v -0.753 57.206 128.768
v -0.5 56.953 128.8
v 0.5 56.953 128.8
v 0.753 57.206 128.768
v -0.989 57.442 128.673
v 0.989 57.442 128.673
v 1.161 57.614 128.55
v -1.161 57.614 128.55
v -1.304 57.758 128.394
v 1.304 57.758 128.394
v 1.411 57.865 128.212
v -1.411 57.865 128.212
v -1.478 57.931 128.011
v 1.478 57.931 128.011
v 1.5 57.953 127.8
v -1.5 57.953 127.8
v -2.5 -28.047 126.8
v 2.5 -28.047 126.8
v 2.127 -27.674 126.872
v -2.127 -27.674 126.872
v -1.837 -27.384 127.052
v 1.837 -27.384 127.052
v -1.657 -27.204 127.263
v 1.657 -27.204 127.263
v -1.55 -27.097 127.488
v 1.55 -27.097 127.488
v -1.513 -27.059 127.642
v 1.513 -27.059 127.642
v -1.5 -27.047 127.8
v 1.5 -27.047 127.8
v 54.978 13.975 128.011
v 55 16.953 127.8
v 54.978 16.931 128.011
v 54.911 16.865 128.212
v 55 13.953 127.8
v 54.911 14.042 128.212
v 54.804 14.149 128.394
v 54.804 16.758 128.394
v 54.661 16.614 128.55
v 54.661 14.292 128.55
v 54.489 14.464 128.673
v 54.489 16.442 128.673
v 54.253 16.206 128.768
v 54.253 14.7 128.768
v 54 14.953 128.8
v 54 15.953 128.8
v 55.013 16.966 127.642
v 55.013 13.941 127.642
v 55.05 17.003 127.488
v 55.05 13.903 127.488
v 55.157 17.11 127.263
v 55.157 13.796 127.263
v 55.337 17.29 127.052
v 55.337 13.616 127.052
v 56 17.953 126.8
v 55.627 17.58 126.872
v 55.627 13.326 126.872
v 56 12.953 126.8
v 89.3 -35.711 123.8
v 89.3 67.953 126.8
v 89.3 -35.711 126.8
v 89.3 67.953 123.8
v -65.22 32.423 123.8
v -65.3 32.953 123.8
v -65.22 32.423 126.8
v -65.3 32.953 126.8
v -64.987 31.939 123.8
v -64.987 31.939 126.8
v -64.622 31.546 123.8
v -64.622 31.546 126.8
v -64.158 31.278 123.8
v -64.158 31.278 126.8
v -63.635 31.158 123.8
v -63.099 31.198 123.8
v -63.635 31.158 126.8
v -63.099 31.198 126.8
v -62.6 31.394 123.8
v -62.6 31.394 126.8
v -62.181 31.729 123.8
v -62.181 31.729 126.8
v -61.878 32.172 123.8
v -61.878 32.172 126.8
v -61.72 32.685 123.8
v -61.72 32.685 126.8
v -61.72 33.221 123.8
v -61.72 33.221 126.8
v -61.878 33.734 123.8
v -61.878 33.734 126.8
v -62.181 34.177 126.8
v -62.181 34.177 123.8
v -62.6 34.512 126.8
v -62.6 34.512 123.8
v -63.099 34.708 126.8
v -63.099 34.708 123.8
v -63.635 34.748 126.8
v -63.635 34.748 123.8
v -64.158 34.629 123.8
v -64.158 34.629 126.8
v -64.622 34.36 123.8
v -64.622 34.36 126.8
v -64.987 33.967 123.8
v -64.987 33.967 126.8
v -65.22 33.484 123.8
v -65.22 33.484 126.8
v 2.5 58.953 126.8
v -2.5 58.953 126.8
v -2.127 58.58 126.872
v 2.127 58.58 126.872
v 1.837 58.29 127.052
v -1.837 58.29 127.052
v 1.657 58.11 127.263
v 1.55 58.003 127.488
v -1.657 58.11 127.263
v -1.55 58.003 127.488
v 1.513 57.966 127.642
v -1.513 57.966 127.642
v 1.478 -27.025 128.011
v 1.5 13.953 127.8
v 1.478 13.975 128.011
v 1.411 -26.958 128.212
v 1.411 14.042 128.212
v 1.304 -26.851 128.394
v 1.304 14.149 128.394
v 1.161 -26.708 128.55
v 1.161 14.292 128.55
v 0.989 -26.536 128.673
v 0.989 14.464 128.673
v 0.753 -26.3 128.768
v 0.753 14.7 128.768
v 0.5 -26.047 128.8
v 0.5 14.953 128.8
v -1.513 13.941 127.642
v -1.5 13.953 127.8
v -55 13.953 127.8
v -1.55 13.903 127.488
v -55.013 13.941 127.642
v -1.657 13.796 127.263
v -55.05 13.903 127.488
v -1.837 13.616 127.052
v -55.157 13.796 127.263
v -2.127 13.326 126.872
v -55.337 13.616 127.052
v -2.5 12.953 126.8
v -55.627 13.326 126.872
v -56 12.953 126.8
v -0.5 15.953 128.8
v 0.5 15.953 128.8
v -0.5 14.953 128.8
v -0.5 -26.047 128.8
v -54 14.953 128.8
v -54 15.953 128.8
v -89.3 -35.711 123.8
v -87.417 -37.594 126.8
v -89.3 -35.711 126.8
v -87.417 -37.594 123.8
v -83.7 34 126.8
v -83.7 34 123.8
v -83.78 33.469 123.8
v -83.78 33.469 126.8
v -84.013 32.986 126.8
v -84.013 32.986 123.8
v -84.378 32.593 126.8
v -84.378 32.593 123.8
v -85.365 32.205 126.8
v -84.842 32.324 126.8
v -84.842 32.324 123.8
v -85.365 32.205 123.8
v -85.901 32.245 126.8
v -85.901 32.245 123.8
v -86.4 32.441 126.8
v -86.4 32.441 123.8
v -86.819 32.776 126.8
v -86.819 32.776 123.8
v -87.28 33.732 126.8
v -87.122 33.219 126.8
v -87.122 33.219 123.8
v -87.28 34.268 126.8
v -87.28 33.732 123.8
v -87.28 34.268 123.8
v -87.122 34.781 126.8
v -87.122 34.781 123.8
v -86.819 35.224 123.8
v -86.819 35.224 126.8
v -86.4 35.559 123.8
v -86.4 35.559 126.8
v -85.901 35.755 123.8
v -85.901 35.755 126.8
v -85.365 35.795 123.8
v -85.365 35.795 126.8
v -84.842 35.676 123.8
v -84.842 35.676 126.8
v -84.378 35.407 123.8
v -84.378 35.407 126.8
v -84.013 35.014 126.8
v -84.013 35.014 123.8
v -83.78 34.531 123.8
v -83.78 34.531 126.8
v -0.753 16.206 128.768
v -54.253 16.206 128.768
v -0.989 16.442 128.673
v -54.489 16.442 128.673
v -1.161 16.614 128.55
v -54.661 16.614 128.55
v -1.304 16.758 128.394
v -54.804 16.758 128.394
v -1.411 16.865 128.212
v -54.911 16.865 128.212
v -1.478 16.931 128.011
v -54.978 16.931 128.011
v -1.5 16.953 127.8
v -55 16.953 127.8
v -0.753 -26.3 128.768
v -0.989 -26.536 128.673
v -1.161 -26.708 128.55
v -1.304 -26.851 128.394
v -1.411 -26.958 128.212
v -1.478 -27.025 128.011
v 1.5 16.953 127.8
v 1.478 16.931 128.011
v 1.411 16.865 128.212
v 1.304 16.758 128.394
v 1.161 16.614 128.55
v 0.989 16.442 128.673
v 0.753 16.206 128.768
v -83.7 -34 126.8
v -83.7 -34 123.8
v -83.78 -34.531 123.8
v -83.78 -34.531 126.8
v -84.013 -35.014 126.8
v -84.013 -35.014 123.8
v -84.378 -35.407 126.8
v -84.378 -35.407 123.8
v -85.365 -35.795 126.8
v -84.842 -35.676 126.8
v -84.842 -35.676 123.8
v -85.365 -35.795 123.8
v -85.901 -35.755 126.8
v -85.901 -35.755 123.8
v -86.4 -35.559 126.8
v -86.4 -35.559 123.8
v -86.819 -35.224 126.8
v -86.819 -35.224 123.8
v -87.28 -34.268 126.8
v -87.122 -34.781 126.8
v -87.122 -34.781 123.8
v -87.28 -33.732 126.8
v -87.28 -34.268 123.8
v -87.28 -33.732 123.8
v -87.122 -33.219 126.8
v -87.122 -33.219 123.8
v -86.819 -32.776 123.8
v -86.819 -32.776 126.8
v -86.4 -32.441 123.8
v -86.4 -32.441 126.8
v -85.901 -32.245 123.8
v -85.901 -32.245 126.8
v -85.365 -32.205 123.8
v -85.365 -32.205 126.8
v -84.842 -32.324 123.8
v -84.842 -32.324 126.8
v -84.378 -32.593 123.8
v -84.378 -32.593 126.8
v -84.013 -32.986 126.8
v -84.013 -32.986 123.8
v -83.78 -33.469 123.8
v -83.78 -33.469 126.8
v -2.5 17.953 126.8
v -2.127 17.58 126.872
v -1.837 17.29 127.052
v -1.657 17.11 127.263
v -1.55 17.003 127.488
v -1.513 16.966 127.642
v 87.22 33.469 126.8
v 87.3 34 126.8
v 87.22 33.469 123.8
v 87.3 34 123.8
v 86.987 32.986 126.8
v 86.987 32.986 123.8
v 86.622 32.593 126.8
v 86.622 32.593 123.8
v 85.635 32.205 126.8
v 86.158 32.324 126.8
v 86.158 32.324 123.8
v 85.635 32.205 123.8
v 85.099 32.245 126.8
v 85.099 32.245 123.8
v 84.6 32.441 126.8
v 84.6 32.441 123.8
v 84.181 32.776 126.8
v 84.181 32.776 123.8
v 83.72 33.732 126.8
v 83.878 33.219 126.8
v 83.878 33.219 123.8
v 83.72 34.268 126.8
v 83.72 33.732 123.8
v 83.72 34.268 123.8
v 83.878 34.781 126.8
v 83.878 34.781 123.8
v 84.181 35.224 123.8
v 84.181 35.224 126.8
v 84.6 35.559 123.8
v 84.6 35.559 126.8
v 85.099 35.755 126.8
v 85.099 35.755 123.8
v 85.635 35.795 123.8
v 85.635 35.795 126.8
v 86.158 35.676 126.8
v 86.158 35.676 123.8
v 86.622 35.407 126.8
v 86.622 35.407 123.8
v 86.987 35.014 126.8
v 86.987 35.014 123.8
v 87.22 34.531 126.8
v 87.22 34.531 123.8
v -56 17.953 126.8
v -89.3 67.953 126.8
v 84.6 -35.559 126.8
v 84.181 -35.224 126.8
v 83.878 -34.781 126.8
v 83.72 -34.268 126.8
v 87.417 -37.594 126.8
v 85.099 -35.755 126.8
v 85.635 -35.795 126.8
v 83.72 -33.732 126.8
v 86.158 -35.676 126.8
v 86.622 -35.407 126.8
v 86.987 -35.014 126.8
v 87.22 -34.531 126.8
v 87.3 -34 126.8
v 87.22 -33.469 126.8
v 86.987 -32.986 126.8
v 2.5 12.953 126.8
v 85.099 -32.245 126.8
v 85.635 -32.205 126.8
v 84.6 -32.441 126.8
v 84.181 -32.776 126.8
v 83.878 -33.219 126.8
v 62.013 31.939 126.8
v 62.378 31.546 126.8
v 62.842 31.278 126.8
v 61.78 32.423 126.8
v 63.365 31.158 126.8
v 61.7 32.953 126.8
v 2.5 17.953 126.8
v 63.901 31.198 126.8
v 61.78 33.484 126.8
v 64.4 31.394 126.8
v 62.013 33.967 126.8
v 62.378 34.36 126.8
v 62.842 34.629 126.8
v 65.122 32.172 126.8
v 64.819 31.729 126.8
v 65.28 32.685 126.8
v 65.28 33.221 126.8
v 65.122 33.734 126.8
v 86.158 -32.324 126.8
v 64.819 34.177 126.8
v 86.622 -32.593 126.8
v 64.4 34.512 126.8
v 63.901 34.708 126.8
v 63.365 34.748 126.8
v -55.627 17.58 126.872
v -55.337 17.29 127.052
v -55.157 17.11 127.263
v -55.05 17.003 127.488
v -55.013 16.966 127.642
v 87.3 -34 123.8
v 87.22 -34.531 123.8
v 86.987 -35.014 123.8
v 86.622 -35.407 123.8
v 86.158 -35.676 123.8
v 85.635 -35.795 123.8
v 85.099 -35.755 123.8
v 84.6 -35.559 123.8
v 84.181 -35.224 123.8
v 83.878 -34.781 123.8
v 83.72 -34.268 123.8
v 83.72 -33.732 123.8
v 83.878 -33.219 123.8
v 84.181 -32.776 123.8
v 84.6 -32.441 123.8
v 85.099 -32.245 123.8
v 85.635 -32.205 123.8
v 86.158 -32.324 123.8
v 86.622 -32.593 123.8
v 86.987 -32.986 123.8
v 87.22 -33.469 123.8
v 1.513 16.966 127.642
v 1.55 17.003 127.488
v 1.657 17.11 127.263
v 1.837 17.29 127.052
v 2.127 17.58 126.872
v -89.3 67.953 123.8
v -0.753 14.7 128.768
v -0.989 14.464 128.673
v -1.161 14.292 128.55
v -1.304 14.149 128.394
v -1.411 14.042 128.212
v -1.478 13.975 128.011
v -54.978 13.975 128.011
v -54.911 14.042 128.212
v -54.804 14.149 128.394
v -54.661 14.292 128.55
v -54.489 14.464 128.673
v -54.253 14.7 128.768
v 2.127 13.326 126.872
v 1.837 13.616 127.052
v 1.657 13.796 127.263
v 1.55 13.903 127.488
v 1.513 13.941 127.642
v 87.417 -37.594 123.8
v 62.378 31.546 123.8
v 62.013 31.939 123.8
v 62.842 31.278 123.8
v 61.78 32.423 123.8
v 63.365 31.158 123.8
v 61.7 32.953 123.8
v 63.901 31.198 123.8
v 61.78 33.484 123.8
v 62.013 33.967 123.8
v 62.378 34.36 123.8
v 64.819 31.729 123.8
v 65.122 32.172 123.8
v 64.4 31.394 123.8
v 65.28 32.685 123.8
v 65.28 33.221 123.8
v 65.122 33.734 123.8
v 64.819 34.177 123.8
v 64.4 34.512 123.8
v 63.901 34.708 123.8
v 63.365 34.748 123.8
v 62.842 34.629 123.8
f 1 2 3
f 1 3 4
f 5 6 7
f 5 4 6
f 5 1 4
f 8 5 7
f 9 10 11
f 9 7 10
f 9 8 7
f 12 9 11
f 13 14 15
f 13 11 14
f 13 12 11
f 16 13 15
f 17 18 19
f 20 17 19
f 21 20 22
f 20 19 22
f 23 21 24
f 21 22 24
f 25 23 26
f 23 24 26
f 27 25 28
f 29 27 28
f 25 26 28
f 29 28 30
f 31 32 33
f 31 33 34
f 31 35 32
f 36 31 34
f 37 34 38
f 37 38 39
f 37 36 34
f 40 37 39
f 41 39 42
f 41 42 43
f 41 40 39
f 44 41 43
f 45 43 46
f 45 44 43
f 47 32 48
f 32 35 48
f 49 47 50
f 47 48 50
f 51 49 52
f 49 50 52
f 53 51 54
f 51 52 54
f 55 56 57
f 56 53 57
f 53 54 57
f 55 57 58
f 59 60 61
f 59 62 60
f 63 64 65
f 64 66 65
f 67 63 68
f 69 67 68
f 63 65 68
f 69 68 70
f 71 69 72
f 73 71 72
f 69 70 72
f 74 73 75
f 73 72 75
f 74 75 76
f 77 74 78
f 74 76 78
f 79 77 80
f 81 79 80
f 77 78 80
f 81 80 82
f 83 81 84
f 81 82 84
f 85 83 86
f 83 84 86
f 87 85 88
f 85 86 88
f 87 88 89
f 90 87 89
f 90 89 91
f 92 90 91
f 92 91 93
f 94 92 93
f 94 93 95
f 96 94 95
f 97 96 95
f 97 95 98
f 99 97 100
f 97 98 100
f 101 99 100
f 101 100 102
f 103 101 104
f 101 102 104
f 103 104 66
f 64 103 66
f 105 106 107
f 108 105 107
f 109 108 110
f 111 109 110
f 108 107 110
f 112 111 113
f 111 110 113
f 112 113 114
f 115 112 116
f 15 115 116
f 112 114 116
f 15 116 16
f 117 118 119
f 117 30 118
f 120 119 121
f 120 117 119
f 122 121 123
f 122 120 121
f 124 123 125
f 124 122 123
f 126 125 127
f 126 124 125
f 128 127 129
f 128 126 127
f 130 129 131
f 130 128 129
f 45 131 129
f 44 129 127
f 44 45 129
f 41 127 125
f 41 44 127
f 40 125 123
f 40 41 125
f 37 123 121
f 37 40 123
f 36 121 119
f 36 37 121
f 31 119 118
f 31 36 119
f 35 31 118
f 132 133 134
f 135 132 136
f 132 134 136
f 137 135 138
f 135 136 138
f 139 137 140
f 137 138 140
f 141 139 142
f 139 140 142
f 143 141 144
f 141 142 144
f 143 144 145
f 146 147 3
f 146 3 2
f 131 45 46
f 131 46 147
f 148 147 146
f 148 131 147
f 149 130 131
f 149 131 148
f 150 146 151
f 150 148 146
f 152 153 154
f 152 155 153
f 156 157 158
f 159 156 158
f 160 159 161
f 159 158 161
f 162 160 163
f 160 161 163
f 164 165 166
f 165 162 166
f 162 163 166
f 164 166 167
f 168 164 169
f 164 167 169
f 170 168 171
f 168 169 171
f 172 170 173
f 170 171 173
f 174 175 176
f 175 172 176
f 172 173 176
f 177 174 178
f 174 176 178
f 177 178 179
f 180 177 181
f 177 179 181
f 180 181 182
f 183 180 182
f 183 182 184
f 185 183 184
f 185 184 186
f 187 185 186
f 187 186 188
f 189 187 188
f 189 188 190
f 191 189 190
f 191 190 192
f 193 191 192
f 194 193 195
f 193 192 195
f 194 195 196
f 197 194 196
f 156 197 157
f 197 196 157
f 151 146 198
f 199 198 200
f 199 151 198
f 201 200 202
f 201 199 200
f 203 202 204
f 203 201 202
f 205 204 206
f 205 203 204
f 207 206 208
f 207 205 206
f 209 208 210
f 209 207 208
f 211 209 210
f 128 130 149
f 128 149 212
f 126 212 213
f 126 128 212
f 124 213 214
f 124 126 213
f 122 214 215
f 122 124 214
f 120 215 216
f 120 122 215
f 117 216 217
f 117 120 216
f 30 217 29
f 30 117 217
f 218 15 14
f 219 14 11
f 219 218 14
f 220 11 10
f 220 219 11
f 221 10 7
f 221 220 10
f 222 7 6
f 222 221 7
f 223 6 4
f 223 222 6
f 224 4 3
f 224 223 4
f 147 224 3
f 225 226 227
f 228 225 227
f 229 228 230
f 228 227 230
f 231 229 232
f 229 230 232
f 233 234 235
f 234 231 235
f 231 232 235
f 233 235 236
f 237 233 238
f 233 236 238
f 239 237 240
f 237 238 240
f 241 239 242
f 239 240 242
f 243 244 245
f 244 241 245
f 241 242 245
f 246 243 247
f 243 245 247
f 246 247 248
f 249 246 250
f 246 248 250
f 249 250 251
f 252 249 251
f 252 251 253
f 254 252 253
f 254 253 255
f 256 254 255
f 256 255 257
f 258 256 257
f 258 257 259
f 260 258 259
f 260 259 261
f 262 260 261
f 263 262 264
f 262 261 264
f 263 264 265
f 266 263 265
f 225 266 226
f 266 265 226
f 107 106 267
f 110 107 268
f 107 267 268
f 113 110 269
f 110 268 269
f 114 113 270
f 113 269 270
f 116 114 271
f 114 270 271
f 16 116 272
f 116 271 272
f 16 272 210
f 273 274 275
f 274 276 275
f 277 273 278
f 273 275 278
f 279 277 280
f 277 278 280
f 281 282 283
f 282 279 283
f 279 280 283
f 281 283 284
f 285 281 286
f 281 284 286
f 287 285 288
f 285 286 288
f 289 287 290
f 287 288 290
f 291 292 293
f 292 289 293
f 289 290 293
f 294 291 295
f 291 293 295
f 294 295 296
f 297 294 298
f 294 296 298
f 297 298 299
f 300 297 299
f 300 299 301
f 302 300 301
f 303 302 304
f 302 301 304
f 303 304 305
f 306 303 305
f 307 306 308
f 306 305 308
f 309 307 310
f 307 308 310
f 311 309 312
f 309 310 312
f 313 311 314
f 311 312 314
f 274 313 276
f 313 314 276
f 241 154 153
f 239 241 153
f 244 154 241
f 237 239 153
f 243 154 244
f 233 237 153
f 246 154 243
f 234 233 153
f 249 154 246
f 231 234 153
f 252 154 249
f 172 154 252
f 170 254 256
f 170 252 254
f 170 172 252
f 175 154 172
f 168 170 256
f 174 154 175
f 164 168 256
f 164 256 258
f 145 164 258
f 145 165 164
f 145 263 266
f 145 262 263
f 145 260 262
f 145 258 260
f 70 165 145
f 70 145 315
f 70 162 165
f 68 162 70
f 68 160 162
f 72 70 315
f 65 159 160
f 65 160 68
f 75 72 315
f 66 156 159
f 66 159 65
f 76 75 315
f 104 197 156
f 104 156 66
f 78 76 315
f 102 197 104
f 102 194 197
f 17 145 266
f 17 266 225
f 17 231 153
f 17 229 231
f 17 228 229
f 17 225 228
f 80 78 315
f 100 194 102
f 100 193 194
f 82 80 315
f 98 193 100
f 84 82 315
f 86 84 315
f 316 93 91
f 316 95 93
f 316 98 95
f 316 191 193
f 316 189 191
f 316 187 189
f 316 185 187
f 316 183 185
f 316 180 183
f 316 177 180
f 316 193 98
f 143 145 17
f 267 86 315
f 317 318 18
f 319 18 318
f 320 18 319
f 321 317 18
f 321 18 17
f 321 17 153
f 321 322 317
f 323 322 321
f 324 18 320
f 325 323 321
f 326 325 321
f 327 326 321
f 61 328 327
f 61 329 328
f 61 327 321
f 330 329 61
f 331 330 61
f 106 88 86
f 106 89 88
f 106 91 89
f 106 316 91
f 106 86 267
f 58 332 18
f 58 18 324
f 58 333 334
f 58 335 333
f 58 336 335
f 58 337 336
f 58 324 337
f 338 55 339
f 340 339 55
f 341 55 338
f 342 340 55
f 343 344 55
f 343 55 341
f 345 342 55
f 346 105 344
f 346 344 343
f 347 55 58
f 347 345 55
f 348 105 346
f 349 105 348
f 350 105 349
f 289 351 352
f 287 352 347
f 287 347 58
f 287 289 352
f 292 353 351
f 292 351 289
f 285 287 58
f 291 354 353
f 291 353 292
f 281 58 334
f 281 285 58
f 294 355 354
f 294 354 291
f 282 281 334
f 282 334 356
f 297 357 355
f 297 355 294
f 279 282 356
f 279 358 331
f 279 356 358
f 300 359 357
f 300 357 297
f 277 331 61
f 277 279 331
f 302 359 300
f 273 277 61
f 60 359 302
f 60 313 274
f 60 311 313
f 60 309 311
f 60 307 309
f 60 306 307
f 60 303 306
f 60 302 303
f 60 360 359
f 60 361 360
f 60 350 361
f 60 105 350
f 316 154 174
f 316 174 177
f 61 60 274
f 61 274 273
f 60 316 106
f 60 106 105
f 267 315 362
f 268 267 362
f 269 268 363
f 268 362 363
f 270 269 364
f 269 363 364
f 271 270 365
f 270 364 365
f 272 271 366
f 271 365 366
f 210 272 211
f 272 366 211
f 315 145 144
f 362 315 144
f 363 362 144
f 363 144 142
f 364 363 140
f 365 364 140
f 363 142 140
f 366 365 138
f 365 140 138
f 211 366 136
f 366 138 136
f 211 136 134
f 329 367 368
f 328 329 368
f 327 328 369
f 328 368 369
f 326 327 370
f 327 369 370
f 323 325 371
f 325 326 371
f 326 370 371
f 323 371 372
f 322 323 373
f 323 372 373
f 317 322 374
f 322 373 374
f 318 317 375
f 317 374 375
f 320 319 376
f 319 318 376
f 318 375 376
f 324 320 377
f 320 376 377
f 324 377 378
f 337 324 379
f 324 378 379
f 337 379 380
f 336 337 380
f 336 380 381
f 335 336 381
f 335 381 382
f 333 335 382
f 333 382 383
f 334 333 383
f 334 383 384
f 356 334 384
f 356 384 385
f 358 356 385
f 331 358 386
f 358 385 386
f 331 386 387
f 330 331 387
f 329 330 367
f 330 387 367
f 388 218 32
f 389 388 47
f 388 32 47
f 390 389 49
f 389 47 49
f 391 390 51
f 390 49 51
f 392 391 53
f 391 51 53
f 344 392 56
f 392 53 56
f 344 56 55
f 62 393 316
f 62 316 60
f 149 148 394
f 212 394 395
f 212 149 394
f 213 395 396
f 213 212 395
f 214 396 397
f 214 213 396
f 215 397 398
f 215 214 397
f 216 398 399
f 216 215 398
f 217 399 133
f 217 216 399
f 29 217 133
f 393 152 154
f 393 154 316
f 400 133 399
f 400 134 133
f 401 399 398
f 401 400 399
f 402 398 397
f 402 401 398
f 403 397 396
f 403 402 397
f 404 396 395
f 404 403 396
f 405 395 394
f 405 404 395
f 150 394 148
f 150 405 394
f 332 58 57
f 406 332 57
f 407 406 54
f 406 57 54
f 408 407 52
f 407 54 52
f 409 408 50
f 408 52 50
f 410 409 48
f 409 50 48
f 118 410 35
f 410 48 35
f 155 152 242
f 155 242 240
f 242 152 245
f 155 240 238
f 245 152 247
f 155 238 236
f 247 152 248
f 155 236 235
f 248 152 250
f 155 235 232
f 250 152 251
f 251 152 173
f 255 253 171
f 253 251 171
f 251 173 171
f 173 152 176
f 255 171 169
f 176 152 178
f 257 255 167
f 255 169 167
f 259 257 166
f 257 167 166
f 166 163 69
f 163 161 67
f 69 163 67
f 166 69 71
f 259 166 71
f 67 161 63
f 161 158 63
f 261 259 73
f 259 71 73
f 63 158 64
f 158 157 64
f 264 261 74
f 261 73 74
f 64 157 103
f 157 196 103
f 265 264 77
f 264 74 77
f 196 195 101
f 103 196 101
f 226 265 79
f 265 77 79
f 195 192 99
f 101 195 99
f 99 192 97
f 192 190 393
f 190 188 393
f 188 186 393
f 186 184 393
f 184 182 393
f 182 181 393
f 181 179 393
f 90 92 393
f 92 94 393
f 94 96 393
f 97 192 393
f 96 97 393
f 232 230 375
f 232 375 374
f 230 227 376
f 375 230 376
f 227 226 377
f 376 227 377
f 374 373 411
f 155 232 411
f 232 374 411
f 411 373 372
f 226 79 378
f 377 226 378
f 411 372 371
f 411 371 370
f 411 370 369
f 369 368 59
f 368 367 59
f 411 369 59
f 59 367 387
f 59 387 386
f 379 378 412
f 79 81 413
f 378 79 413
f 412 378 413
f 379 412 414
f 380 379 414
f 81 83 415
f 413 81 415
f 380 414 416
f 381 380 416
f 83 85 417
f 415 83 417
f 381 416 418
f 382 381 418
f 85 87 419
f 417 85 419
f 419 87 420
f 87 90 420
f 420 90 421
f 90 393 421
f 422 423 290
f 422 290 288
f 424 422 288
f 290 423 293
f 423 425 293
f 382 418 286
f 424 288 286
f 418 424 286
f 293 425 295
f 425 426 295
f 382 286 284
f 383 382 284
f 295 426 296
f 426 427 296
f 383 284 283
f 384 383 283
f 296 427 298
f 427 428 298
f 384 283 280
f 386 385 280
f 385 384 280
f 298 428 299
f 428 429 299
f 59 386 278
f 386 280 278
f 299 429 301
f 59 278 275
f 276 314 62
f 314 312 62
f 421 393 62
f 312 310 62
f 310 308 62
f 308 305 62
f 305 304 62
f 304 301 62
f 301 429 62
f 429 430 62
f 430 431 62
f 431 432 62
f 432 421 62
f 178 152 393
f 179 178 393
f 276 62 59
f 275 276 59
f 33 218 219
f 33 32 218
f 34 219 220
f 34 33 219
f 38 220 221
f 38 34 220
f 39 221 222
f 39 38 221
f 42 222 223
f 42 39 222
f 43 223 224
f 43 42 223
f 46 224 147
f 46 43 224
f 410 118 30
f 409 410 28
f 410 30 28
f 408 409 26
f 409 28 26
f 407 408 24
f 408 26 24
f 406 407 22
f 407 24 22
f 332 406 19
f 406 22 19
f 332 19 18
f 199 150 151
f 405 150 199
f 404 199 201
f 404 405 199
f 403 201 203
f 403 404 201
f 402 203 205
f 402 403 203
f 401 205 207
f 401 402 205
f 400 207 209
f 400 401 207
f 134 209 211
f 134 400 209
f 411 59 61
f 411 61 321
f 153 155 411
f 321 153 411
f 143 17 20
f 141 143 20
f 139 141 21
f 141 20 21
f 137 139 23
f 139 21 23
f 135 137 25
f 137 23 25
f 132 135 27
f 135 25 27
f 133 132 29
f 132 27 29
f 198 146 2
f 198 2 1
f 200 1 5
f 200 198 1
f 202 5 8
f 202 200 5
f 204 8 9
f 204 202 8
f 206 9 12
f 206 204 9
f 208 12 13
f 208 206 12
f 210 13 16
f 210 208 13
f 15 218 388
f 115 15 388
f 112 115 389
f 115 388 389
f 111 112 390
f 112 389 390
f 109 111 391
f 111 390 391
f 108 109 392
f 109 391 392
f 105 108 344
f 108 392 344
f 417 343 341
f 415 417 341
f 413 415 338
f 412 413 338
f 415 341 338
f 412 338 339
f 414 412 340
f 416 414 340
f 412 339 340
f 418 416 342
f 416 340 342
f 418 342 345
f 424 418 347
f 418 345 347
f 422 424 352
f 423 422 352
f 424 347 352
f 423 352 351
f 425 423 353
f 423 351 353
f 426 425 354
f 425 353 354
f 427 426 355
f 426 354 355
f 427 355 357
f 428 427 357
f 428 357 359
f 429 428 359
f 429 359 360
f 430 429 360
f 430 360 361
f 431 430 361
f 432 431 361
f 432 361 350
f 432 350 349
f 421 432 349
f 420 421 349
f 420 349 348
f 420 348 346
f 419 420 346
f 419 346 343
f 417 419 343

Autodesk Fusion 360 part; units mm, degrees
ref_plane "WorkPlane1" through (0, 0, 123.8) normal (0, 0, 1) x (1, 0, 0)
sketch "Sketch1" plane through (0, 0, 123.8) normal (0, 0, 1) x (1, 0, 0)
  circle A0 centre (-85.5, 170) radius 1.4 construction
  line L0 (-81.5, 4) -> (-81.5, 166) construction
  line L1 (-81.5, 166) -> (-81.5, 167) construction
  line L2 (-81.5, 167) -> (-77.5, 167) construction
  line L3 (-77.5, 167) -> (-77.5, 174) construction
  line L4 (-77.5, 174) -> (-81.5, 174) construction
  line L5 (-81.5, 174) -> (-86.5, 174) construction
  line L6 (-87.2574, 174) -> (-87.5, 174) construction
  line L7 (-87.5, 174) -> (-89.5, 172) construction
  line L8 (-89.5, 172) -> (-89.5, 0) construction
  line L9 (-89.5, 0) -> (-81.5, 0) construction
  line L10 (-81.5, 0) -> (-81.5, 4) construction
  circle A1 centre (85.5, 170) radius 1.4 construction
  line L11 (89.5, 0) -> (89.5, 172) construction
  line L12 (89.5, 172) -> (87.5, 174) construction
  line L13 (87.5, 174) -> (86.5, 174) construction
  line L14 (86.5, 174) -> (86.5, 177) construction
  line L15 (86.5, 177) -> (86.45, 177) construction
  line L16 (86.45, 177) -> (86.45, 174) construction
  line L17 (86.45, 174) -> (81.5, 174) construction
  line L18 (81.5, 174) -> (77.5, 174) construction
  line L19 (77.5, 174) -> (77.5, 167) construction
  line L20 (77.5, 167) -> (81.5, 167) construction
  line L21 (81.5, 167) -> (81.5, 0) construction
  line L22 (81.5, 0) -> (89.5, 0) construction
  line L23 (81.5, 0) -> (81.5, -37.7937) construction
  line L24 (81.5, -37.7937) -> (87.5, -37.7937) construction
  line L25 (87.5, -37.7937) -> (89.5, -35.7937) construction
  line L26 (89.5, -35.7937) -> (89.5, -5) construction
  line L27 (89.5, -5) -> (89.5, 0) construction
  line L28 (89.5, 0) -> (81.5, 0) construction
  line L29 (-89.5, 0) -> (-89.5, -35.7937) construction
  line L30 (-89.5, -35.7937) -> (-87.5, -37.7937) construction
  line L31 (-87.5, -37.7937) -> (-81.5, -37.7937) construction
  line L32 (-81.5, -37.7937) -> (-81.5, -5) construction
  line L33 (-81.5, -5) -> (-81.5, 0) construction
  line L34 (-81.5, 0) -> (-89.5, 0) construction
  line L35 (87.5, -37.7937) -> (-87.5, -37.7937) construction
  line L36 (-77.3, 174) -> (77.3, 174) construction
  line L37 (-77.5, 174) -> (77.5, 174)
  line L38 (77.5, 174) -> (87.5, 174)
  line L39 (87.5, 174) -> (89.5, 172)
  line L40 (89.5, 172) -> (89.5, -35.7937)
  line L41 (89.5, -35.7937) -> (87.5, -37.7937)
  line L42 (-87.5, -37.7937) -> (87.5, -37.7937)
  line L43 (-87.5, -37.7937) -> (-89.5, -35.7937)
  line L44 (-89.5, -35.7937) -> (-89.5, 172)
  line L45 (-89.5, 172) -> (-87.5, 174)
  line L46 (-87.5, 174) -> (-77.3, 174)
  circle A2 centre (-85.5, 170) radius 1.8
  circle A3 centre (-85.5, 102) radius 1.8
  circle A4 centre (-85.5, 34) radius 1.8
  circle A5 centre (-85.5, -34) radius 1.8
  circle A6 centre (85.5, -34) radius 1.8
  circle A7 centre (85.5, 34) radius 1.8
  circle A8 centre (85.5, 102) radius 1.8
  circle A9 centre (85.5, 170) radius 1.8
  line L47 (-86.5, 174) -> (-87.2574, 174)
  circle A10 centre (85.5, -34) radius 1.4 construction
  circle A11 centre (-85.5, -34) radius 1.4 construction
  circle A12 centre (-85.5, 34) radius 1.4 construction
  circle A13 centre (-85.5, 102) radius 1.4 construction
  circle A14 centre (85.5, 102) radius 1.4 construction
  circle A15 centre (85.5, 34) radius 1.4 construction
  line L48 (-89.5, 68.1031) -> (89.5, 68.1031) construction
  line L49 (-89.5, 67.9531) -> (89.5, 67.9531)
  line L50 (-77.5, 173.8) -> (-77.3, 173.8)
  line L51 (-77.3, 173.8) -> (77.5, 173.8)
  line L52 (77.5, 173.8) -> (87.4172, 173.8)
  line L53 (87.4172, 173.8) -> (89.3, 171.9172)
  line L54 (89.3, 171.9172) -> (89.3, -35.7109)
  line L55 (89.3, -35.7109) -> (87.4172, -37.5937)
  line L56 (-87.4172, -37.5937) -> (87.4172, -37.5937)
  line L57 (-87.4172, -37.5937) -> (-89.3, -35.7109)
  line L58 (-89.3, -35.7109) -> (-89.3, 171.9172)
  line L59 (-89.3, 171.9172) -> (-87.4172, 173.8)
  line L60 (-87.4172, 173.8) -> (-77.3, 173.8)
  dimension "d2" = 0.2
  dimension "d4" = 3.6
  dimension "d5" = 3.6
  dimension "d6" = 3.6
  dimension "d7" = 3.6
  dimension "d8" = 3.6
  dimension "d9" = 3.6
  dimension "d10" = 3.6
  dimension "d11" = 3.6
  dimension "d14" = 0.15
extrude "Extrude1" add sketch "Sketch1" along normal blind 3 contours L49 L54 L55 L56 L57 L58
sketch "Sketch2" plane through (0, 0, 126.8) normal (0, 0, 1) x (-1, 0, 0)
  circle A0 centre (85.5, 34) radius 1.8
  circle A1 centre (-85.5, 34) radius 1.8
  circle A2 centre (-85.5, -34) radius 1.8
  circle A3 centre (85.5, -34) radius 1.8
  line L0 (87.4172, 37.5937) -> (-87.4172, 37.5937)
  line L1 (-87.4172, 37.5937) -> (-89.3, 35.7109)
  line L2 (-89.3, 35.7109) -> (-89.3, -67.9531)
  line L3 (-89.3, -67.9531) -> (89.3, -67.9531)
  line L4 (89.3, -67.9531) -> (89.3, 35.7109)
  line L5 (89.3, 35.7109) -> (87.4172, 37.5937)
  line L6 (0, -67.9531) -> (0, 37.5937) construction
  line L7 (0, -67.9531) -> (0, -32.9531) construction
  line L8 (0, -32.9531) -> (-63.5, -32.9531) construction
  circle A4 centre (-63.5, -32.9531) radius 1.8
  circle A5 centre (63.5, -32.9531) radius 1.8
  dimension "d15" = 35
  dimension "d16" = 63.5
  dimension "d17" = 3.6
extrude "Extrude2" cut sketch "Sketch2" against normal blind 3 contours A4 | A5
sketch "Sketch3" plane through (0, 0, 126.8) normal (0, 0, 1) x (-1, 0, 0)
  circle A0 centre (-63.5, -32.9531) radius 1.8
  circle A1 centre (63.5, -32.9531) radius 1.8
  circle A2 centre (85.5, 34) radius 1.8
  circle A3 centre (-85.5, 34) radius 1.8
  circle A4 centre (-85.5, -34) radius 1.8
  circle A5 centre (85.5, -34) radius 1.8
  line L0 (87.4172, 37.5937) -> (-87.4172, 37.5937)
  line L1 (-87.4172, 37.5937) -> (-89.3, 35.7109)
  line L2 (-89.3, 35.7109) -> (-89.3, -67.9531)
  line L3 (-89.3, -67.9531) -> (89.3, -67.9531)
  line L4 (89.3, -67.9531) -> (89.3, 35.7109)
  line L5 (89.3, 35.7109) -> (87.4172, 37.5937)
  line L6 (0, -67.9531) -> (0, -57.9531) construction
  line L7 (0, -57.9531) -> (0, 27.0469) construction
  line L8 (0, -15.4531) -> (-55, -15.4531) construction
  line L9 (0, -15.4531) -> (55, -15.4531) construction
  line L10 (1.5, -13.9531) -> (55, -13.9531)
  line L11 (-1.5, -13.9531) -> (-55, -13.9531)
  line L12 (1.5, -16.9531) -> (55, -16.9531)
  line L13 (-1.5, -16.9531) -> (-55, -16.9531)
  line L14 (-55, -16.9531) -> (-55, -13.9531)
  line L15 (55, -16.9531) -> (55, -13.9531)
  line L16 (-1.5, -57.9531) -> (1.5, -57.9531)
  line L17 (1.5, 27.0469) -> (-1.5, 27.0469)
  line L18 (1.5, -57.9531) -> (1.5, -16.9531)
  line L19 (1.5, -13.9531) -> (1.5, 27.0469)
  line L20 (-1.5, -57.9531) -> (-1.5, -16.9531)
  line L21 (-1.5, -13.9531) -> (-1.5, 27.0469)
  dimension "d20" = 10
  dimension "d21" = 85
  dimension "d22" = 55
  dimension "d23" = 55
extrude "Extrude3" add sketch "Sketch3" along normal blind 2 contours L10 L11 L12 L13 L14 L15 L16 L17 L18 L19 L20 L21
fillet "Fillet1" radius 1 12 edges at (-28.25, 13.9531, 126.8) (-1.5, -6.5469, 126.8) (-55, 15.4531, 126.8) (0, -27.0469, 126.8) (1.5, -6.5469, 126.8) (28.25, 13.9531, 126.8) (1.5, 37.4531, 126.8) (55, 15.4531, 126.8) (28.25, 16.9531, 126.8) (0, 57.9531, 126.8) (-28.25, 16.9531, 126.8) (-1.5, 37.4531, 126.8) 1 faces at (19.3333, 15.9531, 128.8)
equation "large_m3 = 3.6 mm"
equation "d4 = large_m3"
equation "d5 = d4"
equation "d6 = d4"
equation "d7 = d4"
equation "d8 = d4"
equation "d9 = d4"
equation "d10 = d4"
equation "d11 = d4"
equation "d16 = ( 127 / 2 ) * 1 mm"
